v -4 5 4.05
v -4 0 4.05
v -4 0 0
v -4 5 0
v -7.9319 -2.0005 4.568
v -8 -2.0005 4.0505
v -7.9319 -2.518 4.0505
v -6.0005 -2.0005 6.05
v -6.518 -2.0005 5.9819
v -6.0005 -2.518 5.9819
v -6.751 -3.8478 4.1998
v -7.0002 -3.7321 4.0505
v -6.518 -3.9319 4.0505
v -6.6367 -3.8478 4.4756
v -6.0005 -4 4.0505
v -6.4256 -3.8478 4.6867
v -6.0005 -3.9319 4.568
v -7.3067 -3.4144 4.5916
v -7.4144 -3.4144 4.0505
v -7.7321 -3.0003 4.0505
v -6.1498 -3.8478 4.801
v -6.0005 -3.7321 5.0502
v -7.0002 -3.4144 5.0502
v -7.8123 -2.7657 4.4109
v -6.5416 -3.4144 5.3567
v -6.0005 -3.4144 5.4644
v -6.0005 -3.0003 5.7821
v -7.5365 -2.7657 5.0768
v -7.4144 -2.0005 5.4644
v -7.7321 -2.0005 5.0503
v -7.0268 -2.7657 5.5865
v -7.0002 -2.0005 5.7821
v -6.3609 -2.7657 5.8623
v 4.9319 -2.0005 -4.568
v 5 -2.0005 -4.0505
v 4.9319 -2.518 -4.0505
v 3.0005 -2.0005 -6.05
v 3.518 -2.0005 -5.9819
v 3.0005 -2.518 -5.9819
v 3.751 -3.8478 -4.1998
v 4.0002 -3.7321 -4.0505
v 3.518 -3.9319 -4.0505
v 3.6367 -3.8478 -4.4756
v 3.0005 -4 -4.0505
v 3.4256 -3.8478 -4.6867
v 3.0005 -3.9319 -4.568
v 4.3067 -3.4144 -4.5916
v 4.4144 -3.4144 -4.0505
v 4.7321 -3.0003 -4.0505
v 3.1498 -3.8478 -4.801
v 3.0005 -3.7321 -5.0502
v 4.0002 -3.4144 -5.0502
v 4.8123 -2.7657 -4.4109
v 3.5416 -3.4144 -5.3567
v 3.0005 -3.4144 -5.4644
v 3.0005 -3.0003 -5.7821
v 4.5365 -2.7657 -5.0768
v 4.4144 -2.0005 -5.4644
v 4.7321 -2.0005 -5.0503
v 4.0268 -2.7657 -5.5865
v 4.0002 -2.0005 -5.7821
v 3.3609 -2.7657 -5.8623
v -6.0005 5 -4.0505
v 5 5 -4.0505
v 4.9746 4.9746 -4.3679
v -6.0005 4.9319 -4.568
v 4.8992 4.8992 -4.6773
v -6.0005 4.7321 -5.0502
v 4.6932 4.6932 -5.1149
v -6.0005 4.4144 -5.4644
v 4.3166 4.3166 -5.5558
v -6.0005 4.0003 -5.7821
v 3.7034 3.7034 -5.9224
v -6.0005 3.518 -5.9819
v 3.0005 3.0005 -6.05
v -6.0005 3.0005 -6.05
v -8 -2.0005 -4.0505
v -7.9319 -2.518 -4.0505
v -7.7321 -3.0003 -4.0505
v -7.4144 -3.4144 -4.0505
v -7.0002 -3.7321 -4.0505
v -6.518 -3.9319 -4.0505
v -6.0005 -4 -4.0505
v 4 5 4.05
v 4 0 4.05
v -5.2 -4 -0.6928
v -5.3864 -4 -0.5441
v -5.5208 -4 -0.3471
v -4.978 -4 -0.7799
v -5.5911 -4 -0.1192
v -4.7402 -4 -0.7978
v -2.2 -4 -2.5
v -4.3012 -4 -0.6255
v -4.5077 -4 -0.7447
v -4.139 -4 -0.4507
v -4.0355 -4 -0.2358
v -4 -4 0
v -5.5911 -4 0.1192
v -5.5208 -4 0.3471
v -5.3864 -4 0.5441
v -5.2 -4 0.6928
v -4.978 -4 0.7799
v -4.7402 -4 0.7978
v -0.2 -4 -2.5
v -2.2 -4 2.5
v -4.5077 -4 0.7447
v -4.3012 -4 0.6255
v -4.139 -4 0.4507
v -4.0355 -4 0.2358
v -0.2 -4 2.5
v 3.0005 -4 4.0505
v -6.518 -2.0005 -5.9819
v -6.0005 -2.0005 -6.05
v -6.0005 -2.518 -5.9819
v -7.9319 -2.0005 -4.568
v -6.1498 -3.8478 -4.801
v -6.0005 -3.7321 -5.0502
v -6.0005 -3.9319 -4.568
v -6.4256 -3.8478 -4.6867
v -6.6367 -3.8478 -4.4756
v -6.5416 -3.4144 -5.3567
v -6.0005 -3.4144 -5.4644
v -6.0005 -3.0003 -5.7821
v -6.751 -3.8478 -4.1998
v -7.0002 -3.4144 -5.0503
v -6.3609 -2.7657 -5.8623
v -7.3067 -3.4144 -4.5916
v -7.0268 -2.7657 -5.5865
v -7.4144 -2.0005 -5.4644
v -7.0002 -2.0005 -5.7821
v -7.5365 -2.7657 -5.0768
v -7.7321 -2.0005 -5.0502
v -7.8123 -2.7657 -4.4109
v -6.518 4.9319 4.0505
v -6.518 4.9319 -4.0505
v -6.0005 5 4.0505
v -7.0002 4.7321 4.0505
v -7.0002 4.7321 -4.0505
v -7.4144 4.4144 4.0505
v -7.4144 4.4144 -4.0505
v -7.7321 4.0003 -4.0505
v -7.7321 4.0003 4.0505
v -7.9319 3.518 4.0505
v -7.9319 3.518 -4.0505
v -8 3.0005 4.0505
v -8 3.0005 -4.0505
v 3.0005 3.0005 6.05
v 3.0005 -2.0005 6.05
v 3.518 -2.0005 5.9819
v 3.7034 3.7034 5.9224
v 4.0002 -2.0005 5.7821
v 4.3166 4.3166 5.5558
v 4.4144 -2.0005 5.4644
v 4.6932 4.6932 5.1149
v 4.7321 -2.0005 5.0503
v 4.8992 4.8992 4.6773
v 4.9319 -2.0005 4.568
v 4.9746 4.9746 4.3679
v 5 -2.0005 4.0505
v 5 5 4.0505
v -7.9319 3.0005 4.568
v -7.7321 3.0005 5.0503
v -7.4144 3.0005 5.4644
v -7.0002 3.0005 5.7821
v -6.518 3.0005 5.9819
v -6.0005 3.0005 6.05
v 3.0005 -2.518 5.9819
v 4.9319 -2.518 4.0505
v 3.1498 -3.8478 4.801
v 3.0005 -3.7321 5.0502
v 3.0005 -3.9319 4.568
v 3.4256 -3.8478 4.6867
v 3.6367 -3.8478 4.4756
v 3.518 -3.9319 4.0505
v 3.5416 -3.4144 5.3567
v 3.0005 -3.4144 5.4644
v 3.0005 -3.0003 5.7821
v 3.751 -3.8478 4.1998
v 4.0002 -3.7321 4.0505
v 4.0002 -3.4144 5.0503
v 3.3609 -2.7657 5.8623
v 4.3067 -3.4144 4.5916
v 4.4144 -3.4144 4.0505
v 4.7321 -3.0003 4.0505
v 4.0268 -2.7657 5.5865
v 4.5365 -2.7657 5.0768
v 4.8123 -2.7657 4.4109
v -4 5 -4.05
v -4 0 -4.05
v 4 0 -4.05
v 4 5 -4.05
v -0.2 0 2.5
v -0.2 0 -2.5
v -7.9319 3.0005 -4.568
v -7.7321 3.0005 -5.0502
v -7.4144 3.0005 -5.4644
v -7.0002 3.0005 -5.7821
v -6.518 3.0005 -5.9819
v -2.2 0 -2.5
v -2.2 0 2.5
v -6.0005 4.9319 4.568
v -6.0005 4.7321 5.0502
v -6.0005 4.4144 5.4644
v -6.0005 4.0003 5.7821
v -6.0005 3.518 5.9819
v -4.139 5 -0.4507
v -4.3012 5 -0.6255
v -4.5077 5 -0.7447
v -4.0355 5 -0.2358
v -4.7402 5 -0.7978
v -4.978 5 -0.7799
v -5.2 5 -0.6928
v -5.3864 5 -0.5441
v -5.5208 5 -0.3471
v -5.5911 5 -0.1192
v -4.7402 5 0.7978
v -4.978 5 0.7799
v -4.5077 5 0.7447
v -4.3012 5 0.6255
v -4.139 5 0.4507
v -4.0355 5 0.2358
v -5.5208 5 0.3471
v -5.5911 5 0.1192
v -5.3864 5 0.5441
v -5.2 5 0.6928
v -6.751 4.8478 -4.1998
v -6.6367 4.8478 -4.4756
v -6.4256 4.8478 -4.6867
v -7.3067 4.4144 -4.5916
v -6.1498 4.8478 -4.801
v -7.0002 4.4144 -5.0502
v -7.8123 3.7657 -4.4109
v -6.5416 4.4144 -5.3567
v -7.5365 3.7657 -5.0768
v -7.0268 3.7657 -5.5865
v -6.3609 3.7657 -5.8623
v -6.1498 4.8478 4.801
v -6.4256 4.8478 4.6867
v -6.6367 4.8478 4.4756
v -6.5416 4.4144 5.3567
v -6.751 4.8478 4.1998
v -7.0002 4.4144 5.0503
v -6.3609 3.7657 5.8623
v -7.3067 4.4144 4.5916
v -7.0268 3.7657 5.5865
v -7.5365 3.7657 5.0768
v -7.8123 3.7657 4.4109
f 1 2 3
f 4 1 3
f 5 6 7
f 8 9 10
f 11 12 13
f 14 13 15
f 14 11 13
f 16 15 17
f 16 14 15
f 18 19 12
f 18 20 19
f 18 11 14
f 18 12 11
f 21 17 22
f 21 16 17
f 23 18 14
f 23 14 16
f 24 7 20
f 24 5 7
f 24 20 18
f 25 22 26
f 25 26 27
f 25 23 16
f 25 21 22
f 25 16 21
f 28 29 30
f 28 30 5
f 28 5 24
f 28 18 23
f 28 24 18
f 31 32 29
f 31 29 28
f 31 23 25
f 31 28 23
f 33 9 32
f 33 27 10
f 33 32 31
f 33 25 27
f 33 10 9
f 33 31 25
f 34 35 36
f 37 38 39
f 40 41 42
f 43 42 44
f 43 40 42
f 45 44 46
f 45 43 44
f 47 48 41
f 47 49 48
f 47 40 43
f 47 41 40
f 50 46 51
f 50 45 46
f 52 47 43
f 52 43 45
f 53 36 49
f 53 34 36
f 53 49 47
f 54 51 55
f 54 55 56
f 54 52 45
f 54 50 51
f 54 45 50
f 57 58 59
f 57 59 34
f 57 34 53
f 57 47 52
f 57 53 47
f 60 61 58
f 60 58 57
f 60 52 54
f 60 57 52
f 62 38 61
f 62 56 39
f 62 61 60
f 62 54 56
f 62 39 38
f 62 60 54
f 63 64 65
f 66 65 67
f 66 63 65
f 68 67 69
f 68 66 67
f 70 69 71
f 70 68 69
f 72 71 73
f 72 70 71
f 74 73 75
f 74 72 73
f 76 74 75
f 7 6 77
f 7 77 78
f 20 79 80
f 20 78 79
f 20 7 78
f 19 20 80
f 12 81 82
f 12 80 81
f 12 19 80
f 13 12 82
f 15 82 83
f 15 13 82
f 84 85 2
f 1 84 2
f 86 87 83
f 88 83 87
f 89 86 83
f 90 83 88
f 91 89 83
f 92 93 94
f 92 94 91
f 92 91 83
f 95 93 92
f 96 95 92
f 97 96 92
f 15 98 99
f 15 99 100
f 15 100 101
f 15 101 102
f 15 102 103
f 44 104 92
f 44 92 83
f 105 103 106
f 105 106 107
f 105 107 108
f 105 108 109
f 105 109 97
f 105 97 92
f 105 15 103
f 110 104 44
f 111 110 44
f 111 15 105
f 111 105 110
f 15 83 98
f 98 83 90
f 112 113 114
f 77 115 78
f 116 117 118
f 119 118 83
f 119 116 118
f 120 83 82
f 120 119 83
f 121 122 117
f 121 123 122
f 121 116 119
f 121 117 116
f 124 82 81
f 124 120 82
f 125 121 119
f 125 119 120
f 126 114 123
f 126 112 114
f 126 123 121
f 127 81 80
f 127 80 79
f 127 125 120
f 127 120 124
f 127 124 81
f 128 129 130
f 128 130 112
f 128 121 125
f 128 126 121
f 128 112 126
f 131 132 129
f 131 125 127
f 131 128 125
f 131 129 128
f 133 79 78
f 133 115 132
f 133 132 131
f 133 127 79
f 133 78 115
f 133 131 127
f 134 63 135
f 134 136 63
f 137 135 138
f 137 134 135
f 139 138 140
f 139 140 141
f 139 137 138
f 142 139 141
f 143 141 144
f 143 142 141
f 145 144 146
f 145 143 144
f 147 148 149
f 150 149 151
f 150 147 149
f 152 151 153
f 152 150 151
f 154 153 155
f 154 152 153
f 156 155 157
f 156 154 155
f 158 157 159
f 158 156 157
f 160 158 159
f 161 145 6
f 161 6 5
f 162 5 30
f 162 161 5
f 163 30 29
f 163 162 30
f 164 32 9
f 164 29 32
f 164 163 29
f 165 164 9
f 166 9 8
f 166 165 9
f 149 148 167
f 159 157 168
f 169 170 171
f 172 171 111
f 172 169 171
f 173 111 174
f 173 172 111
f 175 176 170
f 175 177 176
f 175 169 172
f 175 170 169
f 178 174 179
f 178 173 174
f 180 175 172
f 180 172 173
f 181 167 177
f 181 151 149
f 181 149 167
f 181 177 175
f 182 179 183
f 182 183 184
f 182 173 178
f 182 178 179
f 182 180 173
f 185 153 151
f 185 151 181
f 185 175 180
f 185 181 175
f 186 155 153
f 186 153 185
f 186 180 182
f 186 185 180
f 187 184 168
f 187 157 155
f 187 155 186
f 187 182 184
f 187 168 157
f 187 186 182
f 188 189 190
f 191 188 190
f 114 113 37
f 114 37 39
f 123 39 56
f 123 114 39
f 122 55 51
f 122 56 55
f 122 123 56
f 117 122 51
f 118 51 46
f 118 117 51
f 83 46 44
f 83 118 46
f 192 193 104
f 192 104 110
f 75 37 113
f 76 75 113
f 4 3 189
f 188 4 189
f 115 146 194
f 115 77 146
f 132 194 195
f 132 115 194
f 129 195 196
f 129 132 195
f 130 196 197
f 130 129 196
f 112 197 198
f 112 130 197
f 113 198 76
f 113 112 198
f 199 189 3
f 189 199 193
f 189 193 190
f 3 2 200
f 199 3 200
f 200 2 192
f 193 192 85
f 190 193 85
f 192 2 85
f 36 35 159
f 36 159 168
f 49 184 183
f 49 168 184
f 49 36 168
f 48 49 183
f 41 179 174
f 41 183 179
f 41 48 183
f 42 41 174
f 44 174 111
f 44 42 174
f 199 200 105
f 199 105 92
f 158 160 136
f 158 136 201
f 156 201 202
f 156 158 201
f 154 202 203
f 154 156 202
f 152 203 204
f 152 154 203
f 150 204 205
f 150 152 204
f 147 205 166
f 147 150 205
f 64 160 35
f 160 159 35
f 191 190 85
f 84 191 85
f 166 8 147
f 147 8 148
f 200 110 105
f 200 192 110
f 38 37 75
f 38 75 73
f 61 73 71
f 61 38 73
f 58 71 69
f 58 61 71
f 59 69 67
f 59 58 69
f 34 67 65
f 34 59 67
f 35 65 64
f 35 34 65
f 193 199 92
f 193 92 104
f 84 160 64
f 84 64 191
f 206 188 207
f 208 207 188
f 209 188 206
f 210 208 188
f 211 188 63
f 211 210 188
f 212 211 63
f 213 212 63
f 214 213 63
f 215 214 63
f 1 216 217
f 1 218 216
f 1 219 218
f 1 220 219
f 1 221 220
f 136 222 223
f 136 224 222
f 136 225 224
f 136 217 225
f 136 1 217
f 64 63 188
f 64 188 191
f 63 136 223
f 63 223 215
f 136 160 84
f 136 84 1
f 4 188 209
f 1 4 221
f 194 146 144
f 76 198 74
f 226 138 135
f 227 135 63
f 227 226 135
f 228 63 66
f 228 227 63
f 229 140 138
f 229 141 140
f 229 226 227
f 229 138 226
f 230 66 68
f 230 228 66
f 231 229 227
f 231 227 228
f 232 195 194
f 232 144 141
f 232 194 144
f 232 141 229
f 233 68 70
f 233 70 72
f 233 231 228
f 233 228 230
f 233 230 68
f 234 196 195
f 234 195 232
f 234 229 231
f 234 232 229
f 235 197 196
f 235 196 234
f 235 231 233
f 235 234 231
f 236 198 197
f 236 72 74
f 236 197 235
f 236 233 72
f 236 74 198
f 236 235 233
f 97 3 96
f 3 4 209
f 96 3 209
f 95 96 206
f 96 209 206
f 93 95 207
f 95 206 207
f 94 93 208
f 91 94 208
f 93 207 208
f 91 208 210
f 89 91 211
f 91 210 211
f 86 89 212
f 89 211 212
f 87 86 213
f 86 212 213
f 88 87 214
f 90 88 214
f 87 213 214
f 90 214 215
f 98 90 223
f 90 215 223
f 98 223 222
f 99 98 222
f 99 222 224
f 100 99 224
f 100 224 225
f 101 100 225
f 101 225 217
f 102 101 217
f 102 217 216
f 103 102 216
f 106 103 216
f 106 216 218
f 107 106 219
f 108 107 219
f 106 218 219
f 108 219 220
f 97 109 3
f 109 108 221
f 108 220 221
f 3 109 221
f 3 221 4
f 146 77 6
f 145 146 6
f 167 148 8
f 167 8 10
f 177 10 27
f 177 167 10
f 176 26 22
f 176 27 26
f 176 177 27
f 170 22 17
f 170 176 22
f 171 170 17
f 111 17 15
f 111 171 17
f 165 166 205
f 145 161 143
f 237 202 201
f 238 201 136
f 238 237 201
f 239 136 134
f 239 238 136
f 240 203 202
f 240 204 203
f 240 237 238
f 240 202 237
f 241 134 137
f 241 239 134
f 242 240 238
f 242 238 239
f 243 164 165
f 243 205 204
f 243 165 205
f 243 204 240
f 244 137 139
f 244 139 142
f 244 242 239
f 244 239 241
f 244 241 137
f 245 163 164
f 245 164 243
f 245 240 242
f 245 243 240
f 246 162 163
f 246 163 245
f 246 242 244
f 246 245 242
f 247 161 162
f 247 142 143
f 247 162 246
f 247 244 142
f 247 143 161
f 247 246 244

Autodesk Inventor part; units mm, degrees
ref_plane "YZ Plane" through (0, 0, 0) normal (1, 0, 0) x (0, 1, 0)
ref_plane "XZ Plane" through (0, 0, 0) normal (0, 1, 0) x (-1, 0, 0)
ref_plane "XY Plane" through (0, 0, 0) normal (0, 0, 1) x (1, 0, 0)
sketch "Sketch1" plane through (0, 0, 0) normal (0, 1, 0) x (-1, 0, 0)
  line L0 (-4, 4.05) -> (4, 4.05)
  line L1 (4, 4.05) -> (4, -4.05)
  line L2 (4, -4.05) -> (-4, -4.05)
  line L3 (-4, -4.05) -> (-4, 4.05)
  line L4 (-4, 4.05) -> (4, -4.05) construction
  line L5 (4, 4.05) -> (-4, -4.05) construction
  line L6 (8, 6.05) -> (-5, 6.05)
  line L7 (-5, 6.05) -> (-5, -6.05)
  line L8 (-5, -6.05) -> (8, -6.05)
  line L9 (8, -6.05) -> (8, 6.05)
  point P0 (0, 0)
  dimension "d0" = 8.1
  dimension "d1" = 8
  dimension "d5" = 2
  dimension "d6" = 2
  dimension "d7" = 1
  dimension "d8" = 4
extrude "Extrusion1" add sketch "Sketch1" along normal blind 5
sketch "Sketch2" plane through (0, 0, 0) normal (0, -1, 0) x (1, 0, 0)
  line L0 (5, 6.05) -> (5, -6.05) projected
  line L1 (-8, 6.05) -> (5, 6.05) projected
  line L2 (-8, -6.05) -> (-8, 6.05) projected
  line L3 (5, -6.05) -> (-8, -6.05) projected
  line L4 (4, 4.05) -> (-4, 4.05) projected
  line L5 (4, -4.05) -> (4, 4.05) projected
  line L6 (-4, -4.05) -> (4, -4.05) projected
  line L7 (-4, 4.05) -> (-4, -4.05) projected
  point P0 (0, 0)
extrude "Extrusion2" add sketch "Sketch2" along normal blind 4 contours L0 L3 L2 L1 | L5 L6 L7 L4
sketch "Sketch3" plane through (0, 5, 0) normal (0, 1, 0) x (1, 0, 0)
  line L0 (-4, -4.05) -> (-4, 4.05) projected
  circle A0 centre (-4.8, 0) radius 0.8
  point P0 (0, 0)
  dimension "d14" = 1.6
extrude "Extrusion3" cut sketch "Sketch3" against normal blind 100
sketch "Sketch4" plane through (0, 0, 0) normal (0, 1, 0) x (1, 0, 0)
  line L0 (-0.2, -2.5) -> (-2.2, -2.5)
  line L1 (-2.2, -2.5) -> (-2.2, 2.5)
  line L2 (-2.2, 2.5) -> (-0.2, 2.5)
  line L3 (-0.2, 2.5) -> (-0.2, -2.5)
  line L4 (-0.2, -2.5) -> (-2.2, 2.5) construction
  line L5 (-2.2, -2.5) -> (-0.2, 2.5) construction
  line L6 (-4, -4.05) -> (-4, 0) projected
  point P0 (0, 0)
  point P1 (-1.2, 0)
  point P2 (-1.2, 0)
  dimension "d17" = 5
  dimension "d18" = 3.8
  dimension "d19" = 2
extrude "Extrusion4" cut sketch "Sketch4" against normal blind 100
fillet "Fillet1" radius 2 11 edges at (-8, 0.5, -6.05) (5, 0.5, -6.05) (-8, 0.5, 6.05) (5, 0.5, 6.05) (-1.5, -4, 6.05) (-8, -4, 0) (-1.5, -4, -6.05) (-1.5, 5, 6.05) (-8, 5, 0) (-1.5, 5, -6.05) (5, -4, 0)
properties part number "Cable_tie_connector_p1"
